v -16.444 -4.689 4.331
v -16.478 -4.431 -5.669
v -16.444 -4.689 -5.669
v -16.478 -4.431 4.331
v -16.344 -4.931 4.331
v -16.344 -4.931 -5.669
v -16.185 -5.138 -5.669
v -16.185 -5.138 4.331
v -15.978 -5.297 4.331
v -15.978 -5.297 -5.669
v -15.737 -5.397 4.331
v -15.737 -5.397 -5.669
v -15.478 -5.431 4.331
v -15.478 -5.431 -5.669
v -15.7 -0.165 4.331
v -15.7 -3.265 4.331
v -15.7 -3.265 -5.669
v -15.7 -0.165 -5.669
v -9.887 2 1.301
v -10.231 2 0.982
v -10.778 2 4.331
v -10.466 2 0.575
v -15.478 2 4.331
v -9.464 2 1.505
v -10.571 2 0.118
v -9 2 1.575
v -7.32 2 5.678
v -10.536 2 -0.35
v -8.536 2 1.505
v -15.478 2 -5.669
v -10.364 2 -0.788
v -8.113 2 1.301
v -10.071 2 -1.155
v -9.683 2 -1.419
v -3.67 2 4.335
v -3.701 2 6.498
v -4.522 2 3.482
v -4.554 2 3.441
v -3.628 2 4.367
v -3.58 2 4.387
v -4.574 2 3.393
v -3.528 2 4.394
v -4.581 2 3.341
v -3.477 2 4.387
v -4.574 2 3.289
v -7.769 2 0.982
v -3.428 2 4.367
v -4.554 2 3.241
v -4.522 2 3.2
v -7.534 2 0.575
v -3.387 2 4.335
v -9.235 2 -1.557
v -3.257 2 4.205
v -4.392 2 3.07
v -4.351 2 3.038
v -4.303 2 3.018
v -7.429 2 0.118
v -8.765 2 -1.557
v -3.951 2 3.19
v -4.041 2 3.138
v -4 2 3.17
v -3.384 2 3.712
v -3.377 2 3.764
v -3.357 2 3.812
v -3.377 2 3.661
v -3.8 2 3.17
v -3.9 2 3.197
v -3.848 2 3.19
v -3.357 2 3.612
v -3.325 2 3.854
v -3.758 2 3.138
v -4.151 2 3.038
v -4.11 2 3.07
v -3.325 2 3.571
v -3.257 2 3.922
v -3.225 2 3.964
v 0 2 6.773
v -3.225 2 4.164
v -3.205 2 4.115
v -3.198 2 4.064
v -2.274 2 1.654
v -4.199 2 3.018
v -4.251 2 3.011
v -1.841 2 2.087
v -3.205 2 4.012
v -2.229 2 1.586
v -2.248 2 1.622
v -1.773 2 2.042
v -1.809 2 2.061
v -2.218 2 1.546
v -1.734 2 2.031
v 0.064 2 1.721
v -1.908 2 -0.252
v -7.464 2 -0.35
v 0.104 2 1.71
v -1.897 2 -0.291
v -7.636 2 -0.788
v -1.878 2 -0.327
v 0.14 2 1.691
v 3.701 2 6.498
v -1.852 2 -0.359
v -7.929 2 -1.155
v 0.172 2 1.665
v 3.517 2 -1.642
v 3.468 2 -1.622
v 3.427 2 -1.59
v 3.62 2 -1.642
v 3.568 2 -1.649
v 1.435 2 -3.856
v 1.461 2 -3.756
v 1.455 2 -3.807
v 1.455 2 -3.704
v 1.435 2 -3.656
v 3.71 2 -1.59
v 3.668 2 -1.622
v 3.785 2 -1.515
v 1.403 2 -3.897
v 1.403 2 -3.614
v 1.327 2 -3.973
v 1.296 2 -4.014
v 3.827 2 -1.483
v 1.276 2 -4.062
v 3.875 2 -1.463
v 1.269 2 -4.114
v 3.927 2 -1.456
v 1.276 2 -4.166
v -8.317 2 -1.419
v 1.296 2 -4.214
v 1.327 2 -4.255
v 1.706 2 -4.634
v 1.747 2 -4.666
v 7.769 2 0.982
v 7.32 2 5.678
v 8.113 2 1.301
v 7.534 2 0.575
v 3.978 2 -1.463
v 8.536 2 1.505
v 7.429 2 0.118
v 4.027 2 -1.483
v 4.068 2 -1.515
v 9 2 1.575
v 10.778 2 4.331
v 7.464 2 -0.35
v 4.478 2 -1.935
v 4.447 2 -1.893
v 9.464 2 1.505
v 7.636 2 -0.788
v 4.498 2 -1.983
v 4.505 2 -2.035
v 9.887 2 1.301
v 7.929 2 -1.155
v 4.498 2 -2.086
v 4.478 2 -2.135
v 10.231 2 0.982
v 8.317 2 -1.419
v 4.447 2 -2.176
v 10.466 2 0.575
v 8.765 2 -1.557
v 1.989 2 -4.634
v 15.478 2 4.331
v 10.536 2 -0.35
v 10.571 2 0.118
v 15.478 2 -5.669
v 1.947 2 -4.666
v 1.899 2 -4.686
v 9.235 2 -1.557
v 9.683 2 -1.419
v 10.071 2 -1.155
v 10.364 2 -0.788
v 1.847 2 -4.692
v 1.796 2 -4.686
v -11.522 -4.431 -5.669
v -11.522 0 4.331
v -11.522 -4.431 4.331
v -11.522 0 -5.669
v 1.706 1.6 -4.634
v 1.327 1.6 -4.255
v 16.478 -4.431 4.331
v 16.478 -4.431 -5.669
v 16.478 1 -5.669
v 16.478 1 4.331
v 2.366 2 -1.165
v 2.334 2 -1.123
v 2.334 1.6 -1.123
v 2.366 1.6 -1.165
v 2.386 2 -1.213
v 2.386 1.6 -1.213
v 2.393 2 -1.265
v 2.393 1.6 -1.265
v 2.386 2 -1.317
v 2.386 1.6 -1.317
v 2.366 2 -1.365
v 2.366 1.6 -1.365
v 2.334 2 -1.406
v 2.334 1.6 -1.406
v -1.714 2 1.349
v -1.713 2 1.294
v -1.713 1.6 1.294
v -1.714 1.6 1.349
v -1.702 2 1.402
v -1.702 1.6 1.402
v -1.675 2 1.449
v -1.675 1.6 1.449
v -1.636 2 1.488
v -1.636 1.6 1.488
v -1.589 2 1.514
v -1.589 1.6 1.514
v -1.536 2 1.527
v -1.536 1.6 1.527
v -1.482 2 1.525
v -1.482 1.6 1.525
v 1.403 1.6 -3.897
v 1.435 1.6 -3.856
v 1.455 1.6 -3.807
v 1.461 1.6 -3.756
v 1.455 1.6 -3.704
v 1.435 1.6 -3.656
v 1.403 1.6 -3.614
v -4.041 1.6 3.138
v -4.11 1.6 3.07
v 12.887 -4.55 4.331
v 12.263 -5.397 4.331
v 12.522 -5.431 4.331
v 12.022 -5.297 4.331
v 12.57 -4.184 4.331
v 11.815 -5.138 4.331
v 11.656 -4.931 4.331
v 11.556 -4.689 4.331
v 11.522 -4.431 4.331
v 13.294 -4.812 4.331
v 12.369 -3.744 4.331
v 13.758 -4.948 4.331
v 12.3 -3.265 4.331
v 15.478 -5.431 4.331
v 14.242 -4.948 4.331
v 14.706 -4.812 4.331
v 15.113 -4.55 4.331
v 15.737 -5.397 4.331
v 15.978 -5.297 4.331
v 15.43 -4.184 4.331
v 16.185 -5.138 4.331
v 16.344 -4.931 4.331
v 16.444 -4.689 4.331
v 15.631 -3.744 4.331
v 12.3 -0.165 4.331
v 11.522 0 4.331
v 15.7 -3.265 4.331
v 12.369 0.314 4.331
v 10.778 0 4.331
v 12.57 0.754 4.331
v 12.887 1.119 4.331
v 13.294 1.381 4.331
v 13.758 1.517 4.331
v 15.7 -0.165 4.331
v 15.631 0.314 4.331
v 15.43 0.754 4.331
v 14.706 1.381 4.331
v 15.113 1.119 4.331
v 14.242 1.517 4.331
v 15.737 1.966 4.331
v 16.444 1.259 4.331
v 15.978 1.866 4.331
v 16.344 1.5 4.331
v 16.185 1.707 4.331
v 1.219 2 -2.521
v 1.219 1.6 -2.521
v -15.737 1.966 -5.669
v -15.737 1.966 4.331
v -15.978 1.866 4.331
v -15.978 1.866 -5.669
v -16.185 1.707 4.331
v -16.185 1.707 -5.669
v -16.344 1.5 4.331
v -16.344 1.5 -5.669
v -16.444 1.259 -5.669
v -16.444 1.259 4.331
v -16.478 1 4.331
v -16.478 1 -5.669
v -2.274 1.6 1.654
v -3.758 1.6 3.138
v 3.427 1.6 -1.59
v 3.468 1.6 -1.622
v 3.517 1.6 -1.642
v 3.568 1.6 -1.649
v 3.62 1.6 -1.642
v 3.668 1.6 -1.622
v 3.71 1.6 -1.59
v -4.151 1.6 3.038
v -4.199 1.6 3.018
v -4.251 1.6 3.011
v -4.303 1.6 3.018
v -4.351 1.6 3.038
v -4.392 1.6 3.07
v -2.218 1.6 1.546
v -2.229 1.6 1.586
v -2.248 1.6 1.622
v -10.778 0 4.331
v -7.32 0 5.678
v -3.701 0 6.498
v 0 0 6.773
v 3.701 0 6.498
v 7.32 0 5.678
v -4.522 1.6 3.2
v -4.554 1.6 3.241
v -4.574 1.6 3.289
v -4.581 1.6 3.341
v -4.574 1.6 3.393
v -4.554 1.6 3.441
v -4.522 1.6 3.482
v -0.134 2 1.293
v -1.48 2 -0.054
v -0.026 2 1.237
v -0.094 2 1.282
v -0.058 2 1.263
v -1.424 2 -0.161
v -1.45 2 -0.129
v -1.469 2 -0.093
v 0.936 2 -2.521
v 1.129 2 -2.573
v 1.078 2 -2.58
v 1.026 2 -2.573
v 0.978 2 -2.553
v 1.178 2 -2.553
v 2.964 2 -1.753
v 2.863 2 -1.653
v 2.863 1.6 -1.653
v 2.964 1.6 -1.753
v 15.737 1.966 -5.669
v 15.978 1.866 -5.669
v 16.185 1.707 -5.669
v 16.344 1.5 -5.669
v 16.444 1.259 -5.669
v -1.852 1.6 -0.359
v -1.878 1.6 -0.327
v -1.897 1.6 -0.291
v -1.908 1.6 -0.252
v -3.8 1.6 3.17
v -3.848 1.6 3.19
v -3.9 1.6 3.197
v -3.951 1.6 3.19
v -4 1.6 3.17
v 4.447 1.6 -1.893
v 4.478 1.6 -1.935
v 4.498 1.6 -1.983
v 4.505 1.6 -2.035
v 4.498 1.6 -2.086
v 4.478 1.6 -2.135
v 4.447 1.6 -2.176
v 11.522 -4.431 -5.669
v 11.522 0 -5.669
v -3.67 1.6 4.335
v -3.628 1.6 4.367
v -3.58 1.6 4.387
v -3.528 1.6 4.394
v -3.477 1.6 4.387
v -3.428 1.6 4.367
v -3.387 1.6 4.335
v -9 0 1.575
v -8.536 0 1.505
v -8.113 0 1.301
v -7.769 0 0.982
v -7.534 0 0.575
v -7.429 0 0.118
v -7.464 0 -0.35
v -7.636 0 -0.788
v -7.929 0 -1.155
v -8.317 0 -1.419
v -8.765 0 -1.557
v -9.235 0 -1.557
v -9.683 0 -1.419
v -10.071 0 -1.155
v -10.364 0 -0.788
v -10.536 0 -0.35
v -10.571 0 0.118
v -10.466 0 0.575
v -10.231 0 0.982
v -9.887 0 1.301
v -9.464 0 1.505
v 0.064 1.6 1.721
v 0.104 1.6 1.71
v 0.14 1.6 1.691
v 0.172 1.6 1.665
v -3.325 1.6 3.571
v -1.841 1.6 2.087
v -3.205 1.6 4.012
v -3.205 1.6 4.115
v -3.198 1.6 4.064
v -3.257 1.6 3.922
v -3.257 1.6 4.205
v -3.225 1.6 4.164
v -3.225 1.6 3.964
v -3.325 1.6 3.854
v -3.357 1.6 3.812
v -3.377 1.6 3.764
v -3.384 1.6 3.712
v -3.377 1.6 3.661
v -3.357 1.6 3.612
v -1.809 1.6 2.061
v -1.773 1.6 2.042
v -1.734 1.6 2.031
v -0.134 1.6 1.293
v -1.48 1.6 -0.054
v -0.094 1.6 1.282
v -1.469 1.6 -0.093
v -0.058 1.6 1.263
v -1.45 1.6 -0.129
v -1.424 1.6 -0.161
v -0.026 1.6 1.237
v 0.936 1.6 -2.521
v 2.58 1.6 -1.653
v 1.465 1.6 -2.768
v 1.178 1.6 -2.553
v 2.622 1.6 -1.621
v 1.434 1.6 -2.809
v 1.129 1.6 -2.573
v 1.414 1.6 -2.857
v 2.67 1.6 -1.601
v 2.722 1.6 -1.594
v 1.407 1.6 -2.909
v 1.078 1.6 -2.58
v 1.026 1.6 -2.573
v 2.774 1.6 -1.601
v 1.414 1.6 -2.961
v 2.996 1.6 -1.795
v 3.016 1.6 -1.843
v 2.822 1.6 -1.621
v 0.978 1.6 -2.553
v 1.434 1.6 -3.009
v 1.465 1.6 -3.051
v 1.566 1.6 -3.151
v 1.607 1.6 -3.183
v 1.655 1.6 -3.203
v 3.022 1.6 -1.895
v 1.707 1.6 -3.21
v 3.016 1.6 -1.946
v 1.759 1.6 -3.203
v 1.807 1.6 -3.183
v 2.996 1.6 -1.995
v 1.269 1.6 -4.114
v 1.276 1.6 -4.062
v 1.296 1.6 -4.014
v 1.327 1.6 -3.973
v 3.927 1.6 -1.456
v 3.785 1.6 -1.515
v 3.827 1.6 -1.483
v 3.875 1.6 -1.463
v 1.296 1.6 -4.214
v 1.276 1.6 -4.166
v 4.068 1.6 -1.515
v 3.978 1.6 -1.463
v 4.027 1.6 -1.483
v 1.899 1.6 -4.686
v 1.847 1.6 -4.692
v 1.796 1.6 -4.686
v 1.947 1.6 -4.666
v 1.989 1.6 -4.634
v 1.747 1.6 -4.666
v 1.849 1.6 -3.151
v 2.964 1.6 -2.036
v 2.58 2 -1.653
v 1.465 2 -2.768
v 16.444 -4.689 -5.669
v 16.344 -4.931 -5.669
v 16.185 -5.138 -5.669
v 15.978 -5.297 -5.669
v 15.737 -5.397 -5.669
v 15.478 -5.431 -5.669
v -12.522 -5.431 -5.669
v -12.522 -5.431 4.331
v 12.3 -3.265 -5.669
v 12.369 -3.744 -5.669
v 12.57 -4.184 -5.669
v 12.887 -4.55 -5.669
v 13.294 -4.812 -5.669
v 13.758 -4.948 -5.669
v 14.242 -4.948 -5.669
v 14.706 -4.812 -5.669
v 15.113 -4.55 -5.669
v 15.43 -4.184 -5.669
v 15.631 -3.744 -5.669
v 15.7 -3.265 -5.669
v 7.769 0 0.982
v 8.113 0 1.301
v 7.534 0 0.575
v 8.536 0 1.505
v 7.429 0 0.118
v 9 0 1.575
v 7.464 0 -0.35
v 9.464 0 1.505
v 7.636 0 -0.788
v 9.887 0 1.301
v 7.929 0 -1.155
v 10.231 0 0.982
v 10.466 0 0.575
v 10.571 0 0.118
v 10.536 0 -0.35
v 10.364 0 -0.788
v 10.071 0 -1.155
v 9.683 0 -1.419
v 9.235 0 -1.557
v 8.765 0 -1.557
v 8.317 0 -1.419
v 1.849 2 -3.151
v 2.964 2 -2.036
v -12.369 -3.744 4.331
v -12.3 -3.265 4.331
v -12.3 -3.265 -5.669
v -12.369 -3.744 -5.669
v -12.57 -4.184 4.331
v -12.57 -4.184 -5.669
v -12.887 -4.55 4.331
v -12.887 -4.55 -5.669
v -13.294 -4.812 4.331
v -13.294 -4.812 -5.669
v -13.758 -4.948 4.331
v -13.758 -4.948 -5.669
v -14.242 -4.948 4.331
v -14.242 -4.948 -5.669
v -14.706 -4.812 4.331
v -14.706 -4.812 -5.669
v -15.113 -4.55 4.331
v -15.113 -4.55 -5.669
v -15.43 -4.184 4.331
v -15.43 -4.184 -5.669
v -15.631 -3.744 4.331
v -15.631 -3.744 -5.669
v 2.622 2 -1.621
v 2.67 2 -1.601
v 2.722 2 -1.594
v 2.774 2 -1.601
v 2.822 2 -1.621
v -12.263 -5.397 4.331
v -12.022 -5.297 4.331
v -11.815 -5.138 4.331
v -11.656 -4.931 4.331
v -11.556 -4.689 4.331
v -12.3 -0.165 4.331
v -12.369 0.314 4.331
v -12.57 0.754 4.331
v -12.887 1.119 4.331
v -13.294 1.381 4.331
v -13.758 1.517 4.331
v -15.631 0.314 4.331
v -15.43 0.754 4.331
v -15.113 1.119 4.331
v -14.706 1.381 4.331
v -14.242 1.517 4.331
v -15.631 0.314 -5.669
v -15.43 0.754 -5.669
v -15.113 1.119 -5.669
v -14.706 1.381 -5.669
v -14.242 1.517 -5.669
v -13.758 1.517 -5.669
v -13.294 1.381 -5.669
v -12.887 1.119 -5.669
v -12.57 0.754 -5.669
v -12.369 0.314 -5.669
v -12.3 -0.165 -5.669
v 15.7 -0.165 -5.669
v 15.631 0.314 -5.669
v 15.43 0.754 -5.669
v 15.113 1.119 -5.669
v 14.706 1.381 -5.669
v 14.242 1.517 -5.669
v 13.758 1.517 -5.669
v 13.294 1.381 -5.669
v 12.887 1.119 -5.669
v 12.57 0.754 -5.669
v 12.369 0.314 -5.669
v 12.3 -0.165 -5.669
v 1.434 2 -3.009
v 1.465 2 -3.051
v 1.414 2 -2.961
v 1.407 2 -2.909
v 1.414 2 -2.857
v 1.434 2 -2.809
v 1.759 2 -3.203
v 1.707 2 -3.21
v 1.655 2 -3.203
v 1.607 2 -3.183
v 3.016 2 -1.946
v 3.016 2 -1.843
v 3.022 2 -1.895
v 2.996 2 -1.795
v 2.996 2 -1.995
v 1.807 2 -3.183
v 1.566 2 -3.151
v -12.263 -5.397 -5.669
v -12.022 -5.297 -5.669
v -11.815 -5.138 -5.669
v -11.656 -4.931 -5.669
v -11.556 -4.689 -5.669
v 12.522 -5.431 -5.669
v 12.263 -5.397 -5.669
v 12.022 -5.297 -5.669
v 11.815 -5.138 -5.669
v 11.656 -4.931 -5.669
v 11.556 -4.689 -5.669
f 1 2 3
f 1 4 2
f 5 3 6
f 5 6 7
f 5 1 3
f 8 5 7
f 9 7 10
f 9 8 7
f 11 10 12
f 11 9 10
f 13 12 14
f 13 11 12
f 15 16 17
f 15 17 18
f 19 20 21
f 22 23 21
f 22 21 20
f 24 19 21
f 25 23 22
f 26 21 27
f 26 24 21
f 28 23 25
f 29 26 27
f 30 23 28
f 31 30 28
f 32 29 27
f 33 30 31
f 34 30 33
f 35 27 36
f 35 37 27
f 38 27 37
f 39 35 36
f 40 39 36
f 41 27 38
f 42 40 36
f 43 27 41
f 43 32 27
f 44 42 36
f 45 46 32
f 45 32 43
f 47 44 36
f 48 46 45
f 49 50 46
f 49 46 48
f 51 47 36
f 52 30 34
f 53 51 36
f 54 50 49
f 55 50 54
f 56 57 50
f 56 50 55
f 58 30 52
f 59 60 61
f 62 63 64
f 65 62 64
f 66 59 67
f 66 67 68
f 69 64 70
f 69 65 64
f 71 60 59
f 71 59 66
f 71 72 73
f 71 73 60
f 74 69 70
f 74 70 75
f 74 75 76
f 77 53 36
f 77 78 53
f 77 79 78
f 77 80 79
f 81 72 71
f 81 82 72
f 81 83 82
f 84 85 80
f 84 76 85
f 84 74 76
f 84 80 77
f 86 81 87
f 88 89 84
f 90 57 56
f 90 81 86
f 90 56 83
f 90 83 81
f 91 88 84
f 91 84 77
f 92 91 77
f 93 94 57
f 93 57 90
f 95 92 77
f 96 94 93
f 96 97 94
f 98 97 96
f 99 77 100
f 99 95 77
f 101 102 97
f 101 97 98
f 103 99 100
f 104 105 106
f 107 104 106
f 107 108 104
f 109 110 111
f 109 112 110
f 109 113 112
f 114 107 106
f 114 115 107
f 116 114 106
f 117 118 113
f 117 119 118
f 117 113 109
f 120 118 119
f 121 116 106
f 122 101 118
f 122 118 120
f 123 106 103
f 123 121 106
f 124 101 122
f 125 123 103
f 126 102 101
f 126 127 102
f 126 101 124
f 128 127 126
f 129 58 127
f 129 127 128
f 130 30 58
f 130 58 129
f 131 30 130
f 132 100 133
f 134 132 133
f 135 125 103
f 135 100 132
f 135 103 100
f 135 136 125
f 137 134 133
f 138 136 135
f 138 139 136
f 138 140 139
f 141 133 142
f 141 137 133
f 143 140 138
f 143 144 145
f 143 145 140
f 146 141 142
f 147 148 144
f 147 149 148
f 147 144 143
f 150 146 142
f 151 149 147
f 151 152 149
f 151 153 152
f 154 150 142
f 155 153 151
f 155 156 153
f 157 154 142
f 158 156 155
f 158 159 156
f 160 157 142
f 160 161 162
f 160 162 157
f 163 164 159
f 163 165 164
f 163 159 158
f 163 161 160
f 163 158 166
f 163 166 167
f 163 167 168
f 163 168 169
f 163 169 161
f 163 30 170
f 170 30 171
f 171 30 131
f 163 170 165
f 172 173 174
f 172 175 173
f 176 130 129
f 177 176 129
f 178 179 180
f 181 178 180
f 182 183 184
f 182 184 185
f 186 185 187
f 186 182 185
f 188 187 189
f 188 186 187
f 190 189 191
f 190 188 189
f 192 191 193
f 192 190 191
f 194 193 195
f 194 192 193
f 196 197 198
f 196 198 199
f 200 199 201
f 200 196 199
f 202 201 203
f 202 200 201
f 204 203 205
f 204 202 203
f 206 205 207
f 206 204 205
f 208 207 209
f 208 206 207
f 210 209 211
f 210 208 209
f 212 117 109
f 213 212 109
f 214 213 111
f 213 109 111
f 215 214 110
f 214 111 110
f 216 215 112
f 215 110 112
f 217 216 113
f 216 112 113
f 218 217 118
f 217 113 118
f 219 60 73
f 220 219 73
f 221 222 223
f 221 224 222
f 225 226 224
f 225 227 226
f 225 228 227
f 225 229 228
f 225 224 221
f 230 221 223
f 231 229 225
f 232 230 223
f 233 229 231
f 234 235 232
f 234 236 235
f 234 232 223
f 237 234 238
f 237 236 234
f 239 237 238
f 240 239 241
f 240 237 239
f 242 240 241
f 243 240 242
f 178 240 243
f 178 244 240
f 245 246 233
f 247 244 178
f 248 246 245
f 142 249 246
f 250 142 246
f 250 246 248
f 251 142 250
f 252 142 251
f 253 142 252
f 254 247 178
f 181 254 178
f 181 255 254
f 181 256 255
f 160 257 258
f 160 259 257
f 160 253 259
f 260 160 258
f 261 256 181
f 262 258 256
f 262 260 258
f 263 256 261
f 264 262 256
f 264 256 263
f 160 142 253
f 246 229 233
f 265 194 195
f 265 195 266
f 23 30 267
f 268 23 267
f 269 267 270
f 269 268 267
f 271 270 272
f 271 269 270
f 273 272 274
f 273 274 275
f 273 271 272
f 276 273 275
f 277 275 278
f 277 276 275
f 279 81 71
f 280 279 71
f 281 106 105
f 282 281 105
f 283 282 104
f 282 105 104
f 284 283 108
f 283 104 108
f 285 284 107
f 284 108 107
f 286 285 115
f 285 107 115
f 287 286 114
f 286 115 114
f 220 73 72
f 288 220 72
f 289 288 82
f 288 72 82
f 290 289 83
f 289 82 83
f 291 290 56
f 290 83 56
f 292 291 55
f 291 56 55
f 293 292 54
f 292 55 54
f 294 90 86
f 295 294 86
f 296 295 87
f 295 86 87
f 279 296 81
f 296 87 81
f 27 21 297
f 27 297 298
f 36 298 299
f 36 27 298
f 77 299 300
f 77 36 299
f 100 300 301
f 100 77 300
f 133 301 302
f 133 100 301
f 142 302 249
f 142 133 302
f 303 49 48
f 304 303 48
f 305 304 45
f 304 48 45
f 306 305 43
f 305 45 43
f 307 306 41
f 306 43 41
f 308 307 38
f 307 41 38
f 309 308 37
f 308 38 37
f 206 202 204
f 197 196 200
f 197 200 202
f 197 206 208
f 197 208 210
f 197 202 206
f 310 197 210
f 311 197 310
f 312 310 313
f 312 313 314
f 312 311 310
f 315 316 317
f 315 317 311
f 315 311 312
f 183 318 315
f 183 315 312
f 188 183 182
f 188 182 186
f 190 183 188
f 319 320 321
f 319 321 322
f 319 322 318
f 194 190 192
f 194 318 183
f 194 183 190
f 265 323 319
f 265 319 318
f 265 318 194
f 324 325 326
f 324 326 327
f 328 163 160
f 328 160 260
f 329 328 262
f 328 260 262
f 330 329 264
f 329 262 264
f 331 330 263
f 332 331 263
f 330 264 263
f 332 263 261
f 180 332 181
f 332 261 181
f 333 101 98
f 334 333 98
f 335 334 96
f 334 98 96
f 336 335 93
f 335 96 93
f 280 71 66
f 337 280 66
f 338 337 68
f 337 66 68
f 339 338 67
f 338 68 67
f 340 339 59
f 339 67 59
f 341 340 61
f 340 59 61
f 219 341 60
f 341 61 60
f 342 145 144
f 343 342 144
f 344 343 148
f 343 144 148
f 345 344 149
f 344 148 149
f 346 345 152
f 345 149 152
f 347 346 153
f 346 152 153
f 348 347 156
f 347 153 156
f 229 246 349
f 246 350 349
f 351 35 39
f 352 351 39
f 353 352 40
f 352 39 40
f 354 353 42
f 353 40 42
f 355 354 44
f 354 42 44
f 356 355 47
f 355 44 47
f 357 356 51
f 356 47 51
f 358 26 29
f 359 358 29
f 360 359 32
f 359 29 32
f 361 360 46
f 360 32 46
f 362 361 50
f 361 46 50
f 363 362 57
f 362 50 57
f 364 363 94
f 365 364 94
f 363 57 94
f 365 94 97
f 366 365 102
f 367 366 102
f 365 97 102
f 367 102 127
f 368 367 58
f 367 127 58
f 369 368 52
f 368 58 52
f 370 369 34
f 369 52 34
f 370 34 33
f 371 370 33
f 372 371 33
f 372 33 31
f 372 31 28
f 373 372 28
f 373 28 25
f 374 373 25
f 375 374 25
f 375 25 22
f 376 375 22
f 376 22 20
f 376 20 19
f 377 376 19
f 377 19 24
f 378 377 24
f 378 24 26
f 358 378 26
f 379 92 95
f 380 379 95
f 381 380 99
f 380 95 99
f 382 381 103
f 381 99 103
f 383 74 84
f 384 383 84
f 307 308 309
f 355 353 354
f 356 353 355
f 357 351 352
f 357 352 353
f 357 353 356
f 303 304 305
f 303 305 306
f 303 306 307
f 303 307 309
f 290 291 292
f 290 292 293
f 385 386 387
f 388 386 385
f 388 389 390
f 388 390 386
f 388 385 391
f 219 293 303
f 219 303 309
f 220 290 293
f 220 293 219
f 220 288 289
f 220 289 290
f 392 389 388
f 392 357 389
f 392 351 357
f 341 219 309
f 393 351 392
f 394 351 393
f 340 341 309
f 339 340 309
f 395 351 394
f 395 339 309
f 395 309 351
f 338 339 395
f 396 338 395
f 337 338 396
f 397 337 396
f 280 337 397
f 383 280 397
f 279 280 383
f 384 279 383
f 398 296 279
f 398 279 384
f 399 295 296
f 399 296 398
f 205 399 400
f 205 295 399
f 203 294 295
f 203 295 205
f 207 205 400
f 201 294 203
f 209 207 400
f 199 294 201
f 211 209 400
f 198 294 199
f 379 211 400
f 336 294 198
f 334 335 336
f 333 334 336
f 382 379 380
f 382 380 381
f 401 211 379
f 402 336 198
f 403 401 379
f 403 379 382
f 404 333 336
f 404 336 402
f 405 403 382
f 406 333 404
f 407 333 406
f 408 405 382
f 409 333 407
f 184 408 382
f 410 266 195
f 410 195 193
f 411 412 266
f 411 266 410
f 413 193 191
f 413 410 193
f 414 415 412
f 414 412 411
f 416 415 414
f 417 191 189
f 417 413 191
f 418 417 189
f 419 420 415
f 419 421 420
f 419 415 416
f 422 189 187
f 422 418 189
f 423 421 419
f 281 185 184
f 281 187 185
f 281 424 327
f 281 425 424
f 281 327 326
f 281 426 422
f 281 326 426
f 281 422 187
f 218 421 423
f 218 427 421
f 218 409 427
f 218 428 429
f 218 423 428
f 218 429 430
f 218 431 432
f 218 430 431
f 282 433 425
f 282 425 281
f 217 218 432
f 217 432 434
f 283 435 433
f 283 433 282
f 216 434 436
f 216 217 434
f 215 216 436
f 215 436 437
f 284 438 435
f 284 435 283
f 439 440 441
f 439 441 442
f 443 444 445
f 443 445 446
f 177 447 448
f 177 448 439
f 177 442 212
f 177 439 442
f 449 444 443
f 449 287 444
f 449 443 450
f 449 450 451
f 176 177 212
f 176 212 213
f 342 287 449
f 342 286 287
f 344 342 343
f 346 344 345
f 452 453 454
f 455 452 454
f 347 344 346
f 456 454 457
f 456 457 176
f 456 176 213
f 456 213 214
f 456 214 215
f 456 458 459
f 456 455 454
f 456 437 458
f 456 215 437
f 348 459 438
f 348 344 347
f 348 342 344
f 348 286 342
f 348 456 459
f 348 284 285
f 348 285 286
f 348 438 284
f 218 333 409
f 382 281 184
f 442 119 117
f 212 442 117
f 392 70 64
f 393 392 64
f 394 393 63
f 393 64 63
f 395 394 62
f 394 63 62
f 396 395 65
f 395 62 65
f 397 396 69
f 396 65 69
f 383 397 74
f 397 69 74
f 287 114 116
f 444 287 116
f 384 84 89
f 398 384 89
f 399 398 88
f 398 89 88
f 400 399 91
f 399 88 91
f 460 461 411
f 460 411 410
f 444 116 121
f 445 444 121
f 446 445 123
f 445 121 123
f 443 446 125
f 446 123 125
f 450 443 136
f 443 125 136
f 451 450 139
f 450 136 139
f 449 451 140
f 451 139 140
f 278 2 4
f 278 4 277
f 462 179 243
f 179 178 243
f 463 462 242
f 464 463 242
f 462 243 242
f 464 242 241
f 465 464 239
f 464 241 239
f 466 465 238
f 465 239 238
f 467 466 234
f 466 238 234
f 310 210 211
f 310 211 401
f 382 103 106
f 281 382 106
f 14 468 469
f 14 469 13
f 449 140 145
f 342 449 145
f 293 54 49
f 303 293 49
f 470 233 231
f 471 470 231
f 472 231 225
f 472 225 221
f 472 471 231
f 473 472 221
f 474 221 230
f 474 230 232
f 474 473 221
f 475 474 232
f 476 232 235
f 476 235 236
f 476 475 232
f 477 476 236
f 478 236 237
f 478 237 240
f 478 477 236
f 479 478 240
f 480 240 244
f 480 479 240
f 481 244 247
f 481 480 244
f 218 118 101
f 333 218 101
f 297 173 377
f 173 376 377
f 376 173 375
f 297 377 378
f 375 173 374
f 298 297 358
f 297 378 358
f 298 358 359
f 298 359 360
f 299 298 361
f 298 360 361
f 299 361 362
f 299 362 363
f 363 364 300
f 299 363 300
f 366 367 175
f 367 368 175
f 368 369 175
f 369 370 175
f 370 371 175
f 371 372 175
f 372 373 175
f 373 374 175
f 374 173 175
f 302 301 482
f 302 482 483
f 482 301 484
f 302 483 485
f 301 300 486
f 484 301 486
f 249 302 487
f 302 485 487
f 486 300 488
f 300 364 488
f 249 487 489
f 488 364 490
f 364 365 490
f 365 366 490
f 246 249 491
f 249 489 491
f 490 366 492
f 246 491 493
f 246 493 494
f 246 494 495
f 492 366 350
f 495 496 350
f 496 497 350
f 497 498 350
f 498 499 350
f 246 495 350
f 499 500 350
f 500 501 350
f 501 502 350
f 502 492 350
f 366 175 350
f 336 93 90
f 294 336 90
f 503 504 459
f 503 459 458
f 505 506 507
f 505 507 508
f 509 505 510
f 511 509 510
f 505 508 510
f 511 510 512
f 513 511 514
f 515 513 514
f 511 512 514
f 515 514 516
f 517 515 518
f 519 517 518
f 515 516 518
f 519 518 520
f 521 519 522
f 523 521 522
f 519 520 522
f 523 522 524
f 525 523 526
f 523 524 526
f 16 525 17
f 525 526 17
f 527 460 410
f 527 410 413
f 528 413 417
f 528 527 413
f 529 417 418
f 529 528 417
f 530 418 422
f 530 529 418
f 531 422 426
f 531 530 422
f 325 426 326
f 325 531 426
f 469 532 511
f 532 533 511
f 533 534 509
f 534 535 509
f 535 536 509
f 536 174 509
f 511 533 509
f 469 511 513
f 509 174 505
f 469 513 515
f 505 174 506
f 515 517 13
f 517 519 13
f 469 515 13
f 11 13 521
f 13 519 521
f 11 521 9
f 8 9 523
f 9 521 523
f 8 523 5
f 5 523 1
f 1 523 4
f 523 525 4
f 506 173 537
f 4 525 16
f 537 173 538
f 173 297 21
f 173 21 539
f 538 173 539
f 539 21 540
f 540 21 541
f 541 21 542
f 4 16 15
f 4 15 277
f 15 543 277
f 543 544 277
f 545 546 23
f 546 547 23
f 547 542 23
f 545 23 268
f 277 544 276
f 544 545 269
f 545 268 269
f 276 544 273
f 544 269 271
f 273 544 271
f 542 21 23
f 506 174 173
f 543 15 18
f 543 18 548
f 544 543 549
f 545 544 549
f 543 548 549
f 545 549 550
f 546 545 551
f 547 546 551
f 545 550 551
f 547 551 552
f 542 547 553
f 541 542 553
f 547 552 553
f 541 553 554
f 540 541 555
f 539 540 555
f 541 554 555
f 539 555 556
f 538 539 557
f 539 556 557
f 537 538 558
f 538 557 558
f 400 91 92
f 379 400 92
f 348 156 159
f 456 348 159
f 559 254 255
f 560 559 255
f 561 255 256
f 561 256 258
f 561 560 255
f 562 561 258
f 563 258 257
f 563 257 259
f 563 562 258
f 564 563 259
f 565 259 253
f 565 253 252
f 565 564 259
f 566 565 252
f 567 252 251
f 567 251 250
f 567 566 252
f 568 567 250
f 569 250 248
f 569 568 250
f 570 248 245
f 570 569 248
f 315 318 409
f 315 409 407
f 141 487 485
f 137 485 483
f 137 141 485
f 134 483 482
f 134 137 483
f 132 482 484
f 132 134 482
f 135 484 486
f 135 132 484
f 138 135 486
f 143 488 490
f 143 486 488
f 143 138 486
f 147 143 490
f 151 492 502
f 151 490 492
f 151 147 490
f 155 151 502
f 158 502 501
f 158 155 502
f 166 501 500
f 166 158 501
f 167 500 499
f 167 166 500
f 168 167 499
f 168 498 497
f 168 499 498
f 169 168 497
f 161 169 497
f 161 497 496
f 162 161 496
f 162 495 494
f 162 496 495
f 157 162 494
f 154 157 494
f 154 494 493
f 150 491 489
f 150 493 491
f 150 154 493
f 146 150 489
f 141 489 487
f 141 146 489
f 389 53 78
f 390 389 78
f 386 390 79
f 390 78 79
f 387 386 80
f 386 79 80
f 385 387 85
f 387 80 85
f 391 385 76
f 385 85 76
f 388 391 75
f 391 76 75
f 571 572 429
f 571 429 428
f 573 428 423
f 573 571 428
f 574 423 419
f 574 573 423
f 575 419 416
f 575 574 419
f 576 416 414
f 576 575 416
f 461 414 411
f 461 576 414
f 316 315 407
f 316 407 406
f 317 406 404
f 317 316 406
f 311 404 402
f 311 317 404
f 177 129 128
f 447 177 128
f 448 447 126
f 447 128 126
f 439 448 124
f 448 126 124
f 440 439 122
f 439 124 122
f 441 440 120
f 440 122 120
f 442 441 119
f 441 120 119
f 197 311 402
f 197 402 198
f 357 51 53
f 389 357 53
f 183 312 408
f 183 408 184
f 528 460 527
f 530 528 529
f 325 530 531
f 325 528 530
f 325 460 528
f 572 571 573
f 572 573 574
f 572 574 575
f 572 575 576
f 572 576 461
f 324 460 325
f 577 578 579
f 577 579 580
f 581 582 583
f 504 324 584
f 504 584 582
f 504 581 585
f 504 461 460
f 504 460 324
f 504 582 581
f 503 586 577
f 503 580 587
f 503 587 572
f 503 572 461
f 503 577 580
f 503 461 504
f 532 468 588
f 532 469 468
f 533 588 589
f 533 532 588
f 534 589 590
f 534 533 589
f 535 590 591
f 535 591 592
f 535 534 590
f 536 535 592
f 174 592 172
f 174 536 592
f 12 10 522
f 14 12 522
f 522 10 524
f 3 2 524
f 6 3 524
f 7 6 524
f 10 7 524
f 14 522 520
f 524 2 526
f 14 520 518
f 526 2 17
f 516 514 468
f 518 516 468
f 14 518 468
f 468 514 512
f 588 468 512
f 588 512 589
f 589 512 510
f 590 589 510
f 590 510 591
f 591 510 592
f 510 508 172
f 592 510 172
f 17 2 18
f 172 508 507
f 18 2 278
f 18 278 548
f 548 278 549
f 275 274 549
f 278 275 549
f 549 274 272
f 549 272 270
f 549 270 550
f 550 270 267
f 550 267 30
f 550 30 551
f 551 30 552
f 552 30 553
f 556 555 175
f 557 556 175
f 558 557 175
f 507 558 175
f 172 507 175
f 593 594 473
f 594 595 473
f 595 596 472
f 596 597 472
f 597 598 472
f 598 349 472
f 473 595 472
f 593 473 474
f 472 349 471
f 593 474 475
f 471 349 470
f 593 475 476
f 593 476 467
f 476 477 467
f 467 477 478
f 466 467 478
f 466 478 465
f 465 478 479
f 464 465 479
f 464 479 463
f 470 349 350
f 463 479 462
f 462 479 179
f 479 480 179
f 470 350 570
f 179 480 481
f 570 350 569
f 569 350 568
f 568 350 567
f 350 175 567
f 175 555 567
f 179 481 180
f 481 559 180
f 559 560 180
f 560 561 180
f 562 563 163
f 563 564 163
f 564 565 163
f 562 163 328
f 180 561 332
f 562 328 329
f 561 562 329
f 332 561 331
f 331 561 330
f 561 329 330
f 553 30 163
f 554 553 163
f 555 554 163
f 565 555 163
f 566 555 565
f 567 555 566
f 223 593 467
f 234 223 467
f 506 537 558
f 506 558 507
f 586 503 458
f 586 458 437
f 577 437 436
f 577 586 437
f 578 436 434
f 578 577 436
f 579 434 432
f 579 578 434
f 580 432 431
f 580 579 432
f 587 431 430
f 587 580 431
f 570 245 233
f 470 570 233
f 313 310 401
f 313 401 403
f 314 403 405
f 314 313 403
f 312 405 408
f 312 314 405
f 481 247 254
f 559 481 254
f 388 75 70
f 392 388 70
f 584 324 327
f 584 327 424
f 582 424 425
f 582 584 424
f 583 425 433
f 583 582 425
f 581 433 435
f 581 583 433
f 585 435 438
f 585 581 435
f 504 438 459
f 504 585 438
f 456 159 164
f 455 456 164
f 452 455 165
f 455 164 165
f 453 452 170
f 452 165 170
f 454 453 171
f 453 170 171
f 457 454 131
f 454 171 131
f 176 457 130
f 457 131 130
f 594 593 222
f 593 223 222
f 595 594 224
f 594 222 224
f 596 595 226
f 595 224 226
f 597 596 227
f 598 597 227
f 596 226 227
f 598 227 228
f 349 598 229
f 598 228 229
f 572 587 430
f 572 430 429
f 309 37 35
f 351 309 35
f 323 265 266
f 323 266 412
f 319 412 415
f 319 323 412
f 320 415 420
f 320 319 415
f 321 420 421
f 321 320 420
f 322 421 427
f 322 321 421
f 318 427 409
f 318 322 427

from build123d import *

# Parameters (mm, degrees)
SKETCH_1_W          = 27.112781954
SKETCH_1_H          = 9.518796992
SKETCH_1_R          = 1.575
EXTRUDE_1_DEPTH     = 2
SKETCH_2_W          = 27.112781954
SKETCH_2_H          = 2
EXTRUDE_2_DEPTH     = 0.91
CUT_EXTRUDE_1_DEPTH = 15.829626281
CUT_EXTRUDE_2_DEPTH = 17.785702449
EXTRUDE_3_DEPTH     = 10
SKETCH_8_R          = 1.575
CUT_EXTRUDE_3_DEPTH = 10
EXTRUDE_4_DEPTH     = 2
FILLET_2_R          = 1
CUT_EXTRUDE_4_DEPTH = 0.4


with BuildPart() as part:
    # Эскиз1 → Бобышка-Вытянуть1 (new body)
    with BuildSketch(Plane(origin=(0, 0, 0), x_dir=(1, 0, 0), z_dir=(0, 1, 0))):
        Rectangle(SKETCH_1_W, SKETCH_1_H)
        with Locations(Location((-9, 0, 0), (0, 0, 270))):
            Circle(SKETCH_1_R, mode=Mode.SUBTRACT)
        with Locations(Location((9, 0, 0), (0, 0, 270))):
            Circle(SKETCH_1_R, mode=Mode.SUBTRACT)
    extrude(amount=EXTRUDE_1_DEPTH)

    # Эскиз2 → Бобышка-Вытянуть2 (add)
    with BuildSketch(Plane(origin=(0, 0, -4.759398496), x_dir=(-1, 0, 0), z_dir=(0, 0, -1))):
        with Locations((0, 1)):
            Rectangle(SKETCH_2_W, SKETCH_2_H)
    extrude(amount=EXTRUDE_2_DEPTH)

    # Эскиз3 → Вырез-Вытянуть1 (cut, through all)
    with BuildSketch(Plane.XZ):
        Polygon((-6.720997268, 4.759398496), (-3, 5.765), (-14.556442119, 5.765), (-14.556442119, -5.765), (-3, -5.765), (-3.353751395, -5.669398496), (-13.556390977, -5.669398496), (-13.556390977, 4.759398496), align=None)
        with BuildLine():
            Line((-10.043565082, 3.861472766), (-6.720997268, 4.759398496))
            Line((-6.720997268, 4.759398496), (-13.556390977, 4.759398496))
            Line((-13.556390977, 4.759398496), (-13.556390977, -5.669398496))
            Line((-13.556390977, -5.669398496), (-3.353751395, -5.669398496))
            Line((-3.353751395, -5.669398496), (-10.043565082, -3.861472766))
            ThreePointArc((-10.043565082, -3.861472766), (-13, 0), (-10.043565082, 3.861472766))
        make_face()
        with BuildLine():
            Line((13.556390977, 4.759398496), (6.720997268, 4.759398496))
            Line((6.720997268, 4.759398496), (10.043565082, 3.861472766))
            ThreePointArc((10.043565082, 3.861472766), (12.17602427, 2.431639331), (13, 0))
            ThreePointArc((13, 0), (12.17602427, -2.431639331), (10.043565082, -3.861472766))
            Line((10.043565082, -3.861472766), (3.353751395, -5.669398496))
            Line((3.353751395, -5.669398496), (13.556390977, -5.669398496))
            Line((13.556390977, -5.669398496), (13.556390977, 4.759398496))
        make_face()
        Polygon((3, 5.765), (6.720997268, 4.759398496), (13.556390977, 4.759398496), (13.556390977, -5.669398496), (3.353751395, -5.669398496), (3, -5.765), (14.556442119, -5.765), (14.556442119, 5.765), align=None)
    extrude(amount=-CUT_EXTRUDE_1_DEPTH, mode=Mode.SUBTRACT)

    # Эскиз4 → Вырез-Вытянуть2 (cut, through all)
    with BuildSketch(Plane(origin=(0, 0, -5.669398496), x_dir=(-1, 0, 0), z_dir=(0, 0, -1))):
        Polygon((11.521782541, 2), (11.521782541, -6.403006286), (13.618299284, -6.403006286), (13.618299284, 3.686124148), (11.521782541, 3.686124148), align=None)
        Polygon((-13.618299284, -6.403006286), (-11.521782541, -6.403006286), (-11.521782541, 2), (-11.521782541, 3.686124148), (-13.618299284, 3.686124148), align=None)
    extrude(amount=-CUT_EXTRUDE_2_DEPTH, mode=Mode.SUBTRACT)

    # Эскиз7 → Бобышка-Вытянуть3 (add)
    with BuildSketch(Plane(origin=(0, 0, -5.669398496), x_dir=(-1, 0, 0), z_dir=(0, 0, -1))):
        Polygon((3.353751395, 0), (11.521782541, 0), (11.521782541, -5.430586026), (16.478217459, -5.430586026), (16.478217459, 2), (11.521782541, 2), (3.353751395, 2), align=None)
        with BuildLine():
            Line((15.7, -3.265293013), (15.7, -0.165293013))
            ThreePointArc((15.7, -0.165293013), (14, 1.534706987), (12.3, -0.165293013))
            Line((12.3, -0.165293013), (12.3, -3.265293013))
            ThreePointArc((12.3, -3.265293013), (14, -4.965293013), (15.7, -3.265293013))
        make_face(mode=Mode.SUBTRACT)
    extrude_3 = extrude(amount=-EXTRUDE_3_DEPTH)

    # Эскиз8 → Вырез-Вытянуть3 (cut)
    with BuildSketch(Plane(origin=(0, 2, 0), x_dir=(1, 0, 0), z_dir=(0, 1, 0))):
        with Locations(Location((-9, 0, 0), (0, 0, 270))):
            Circle(SKETCH_8_R)
    cut_extrude_3 = extrude(amount=-CUT_EXTRUDE_3_DEPTH, mode=Mode.SUBTRACT)

    # Зеркальное отражение1: Бобышка-Вытянуть3, Вырез-Вытянуть3 across plane
    add(extrude_3.mirror(Plane(origin=(0, 0, 0), x_dir=(0, 0, 1), z_dir=(1, 0, 0))))
    add(cut_extrude_3.mirror(Plane(origin=(0, 0, 0), x_dir=(0, 0, 1), z_dir=(1, 0, 0))), mode=Mode.SUBTRACT)

    # Эскиз9 → Бобышка-Вытянуть4 (add)
    with BuildSketch(Plane(origin=(0, 2, 0), x_dir=(1, 0, 0), z_dir=(0, 1, 0))):
        with BuildLine():
            Line((6.720997268, -4.759398496), (-6.720997268, -4.759398496))
            Line((-6.720997268, -4.759398496), (-8.307661997, -4.330601504))
            Line((-8.307661997, -4.330601504), (-10.777839616, -4.330601504))
            ThreePointArc((-10.777839616, -4.330601504), (0, -6.773159867), (10.777839616, -4.330601504))
            Line((10.777839616, -4.330601504), (8.307661997, -4.330601504))
            Line((8.307661997, -4.330601504), (6.720997268, -4.759398496))
        make_face()
    extrude(amount=-EXTRUDE_4_DEPTH)

    # Скругление2
    fillet_2_edges = [part.edges().sort_by_distance(p)[0] for p in [
        (-16.478217459, 2, -0.669398496),
        (-16.478217459, -5.430586026, -0.669398496),
        (-11.521782541, -5.430586026, -0.669398496),
        (11.521782541, -5.430586026, -0.669398496),
        (16.478217459, -5.430586026, -0.669398496),
        (16.478217459, 2, -0.669398496),
    ]]
    fillet(fillet_2_edges, radius=FILLET_2_R)

    # Эскиз12 → Вырез-Вытянуть4 (cut)
    with BuildSketch(Plane(origin=(0, 2, 0), x_dir=(1, 0, 0), z_dir=(0, 1, 0))):
        with BuildLine():
            Line((4.446560813, 2.176089775), (1.988755362, 4.633895225))
            ThreePointArc((1.988755362, 4.633895225), (1.847334006, 4.692473869), (1.70591265, 4.633895225))
            Line((1.70591265, 4.633895225), (1.327376273, 4.255358849))
            ThreePointArc((1.327376273, 4.255358849), (1.268797629, 4.113937492), (1.327376273, 3.972516136))
            Line((1.327376273, 3.972516136), (1.402795262, 3.897097148))
            ThreePointArc((1.402795262, 3.897097148), (1.461373905, 3.755675791), (1.402795262, 3.614254435))
            Line((1.402795262, 3.614254435), (-1.852293326, 0.359165847))
            ThreePointArc((-1.852293326, 0.359165847), (-1.888439649, 0.309775569), (-1.907956953, 0.25176668))
            Line((-1.907956953, 0.25176668), (-2.218358166, -1.546336835))
            ThreePointArc((-2.218358166, -1.546336835), (-2.23787547, -1.604345724), (-2.274021793, -1.653736003))
            Line((-2.274021793, -1.653736003), (-3.75824321, -3.13795742))
            ThreePointArc((-3.75824321, -3.13795742), (-3.899664566, -3.196536063), (-4.041085922, -3.13795742))
            Line((-4.041085922, -3.13795742), (-4.109500023, -3.069543319))
            ThreePointArc((-4.109500023, -3.069543319), (-4.250921379, -3.010964675), (-4.392342735, -3.069543319))
            Line((-4.392342735, -3.069543319), (-4.522380617, -3.1995812))
            ThreePointArc((-4.522380617, -3.1995812), (-4.58095926, -3.341002556), (-4.522380617, -3.482423913))
            Line((-4.522380617, -3.482423913), (-3.669758325, -4.335046204))
            ThreePointArc((-3.669758325, -4.335046204), (-3.528336969, -4.393624848), (-3.386915613, -4.335046204))
            Line((-3.386915613, -4.335046204), (-3.256877732, -4.205008323))
            ThreePointArc((-3.256877732, -4.205008323), (-3.198299088, -4.063586966), (-3.256877732, -3.92216561))
            Line((-3.256877732, -3.92216561), (-3.325291832, -3.853751509))
            ThreePointArc((-3.325291832, -3.853751509), (-3.383870476, -3.712330153), (-3.325291832, -3.570908797))
            Line((-3.325291832, -3.570908797), (-1.841070415, -2.08668738))
            ThreePointArc((-1.841070415, -2.08668738), (-1.791680137, -2.050541057), (-1.733671248, -2.031023753))
            Line((-1.733671248, -2.031023753), (0.064432267, -1.720622541))
            ThreePointArc((0.064432267, -1.720622541), (0.122441156, -1.701105237), (0.171831435, -1.664958913))
            Line((0.171831435, -1.664958913), (3.426920022, 1.590129674))
            ThreePointArc((3.426920022, 1.590129674), (3.568341379, 1.648708318), (3.709762735, 1.590129674))
            Line((3.709762735, 1.590129674), (3.785181724, 1.514710686))
            ThreePointArc((3.785181724, 1.514710686), (3.92660308, 1.456132042), (4.068024436, 1.514710686))
            Line((4.068024436, 1.514710686), (4.446560813, 1.893247062))
            ThreePointArc((4.446560813, 1.893247062), (4.505139456, 2.034668419), (4.446560813, 2.176089775))
        make_face()
        with BuildLine():
            Line((2.963799211, 2.036003209), (1.848668796, 3.151133624))
            ThreePointArc((1.848668796, 3.151133624), (1.70724744, 3.209712267), (1.565826084, 3.151133624))
            Line((1.565826084, 3.151133624), (1.465360653, 3.050668193))
            ThreePointArc((1.465360653, 3.050668193), (1.406782009, 2.909246836), (1.465360653, 2.76782548))
            Line((1.465360653, 2.76782548), (2.580491067, 1.652695065))
            ThreePointArc((2.580491067, 1.652695065), (2.721912424, 1.594116422), (2.86333378, 1.652695065))
            Line((2.86333378, 1.652695065), (2.963799211, 1.753160497))
            ThreePointArc((2.963799211, 1.753160497), (3.022377855, 1.894581853), (2.963799211, 2.036003209))
        make_face(mode=Mode.SUBTRACT)
        with BuildLine():
            Line((2.334078689, 1.406282687), (1.218948275, 2.521413102))
            ThreePointArc((1.218948275, 2.521413102), (1.077526918, 2.579991746), (0.936105562, 2.521413102))
            Line((0.936105562, 2.521413102), (-1.42428076, 0.16102678))
            ThreePointArc((-1.42428076, 0.16102678), (-1.460427083, 0.111636501), (-1.479944387, 0.053627613))
            Line((-1.479944387, 0.053627613), (-1.712610446, -1.294168861))
            ThreePointArc((-1.712610446, -1.294168861), (-1.656946819, -1.469612406), (-1.481503274, -1.525276034))
            Line((-1.481503274, -1.525276034), (-0.1337068, -1.292609974))
            ThreePointArc((-0.1337068, -1.292609974), (-0.075697911, -1.27309267), (-0.026307633, -1.236946347))
            Line((-0.026307633, -1.236946347), (2.334078689, 1.123439975))
            ThreePointArc((2.334078689, 1.123439975), (2.392657333, 1.264861331), (2.334078689, 1.406282687))
        make_face(mode=Mode.SUBTRACT)
    extrude(amount=-CUT_EXTRUDE_4_DEPTH, mode=Mode.SUBTRACT)


solid = part.part
